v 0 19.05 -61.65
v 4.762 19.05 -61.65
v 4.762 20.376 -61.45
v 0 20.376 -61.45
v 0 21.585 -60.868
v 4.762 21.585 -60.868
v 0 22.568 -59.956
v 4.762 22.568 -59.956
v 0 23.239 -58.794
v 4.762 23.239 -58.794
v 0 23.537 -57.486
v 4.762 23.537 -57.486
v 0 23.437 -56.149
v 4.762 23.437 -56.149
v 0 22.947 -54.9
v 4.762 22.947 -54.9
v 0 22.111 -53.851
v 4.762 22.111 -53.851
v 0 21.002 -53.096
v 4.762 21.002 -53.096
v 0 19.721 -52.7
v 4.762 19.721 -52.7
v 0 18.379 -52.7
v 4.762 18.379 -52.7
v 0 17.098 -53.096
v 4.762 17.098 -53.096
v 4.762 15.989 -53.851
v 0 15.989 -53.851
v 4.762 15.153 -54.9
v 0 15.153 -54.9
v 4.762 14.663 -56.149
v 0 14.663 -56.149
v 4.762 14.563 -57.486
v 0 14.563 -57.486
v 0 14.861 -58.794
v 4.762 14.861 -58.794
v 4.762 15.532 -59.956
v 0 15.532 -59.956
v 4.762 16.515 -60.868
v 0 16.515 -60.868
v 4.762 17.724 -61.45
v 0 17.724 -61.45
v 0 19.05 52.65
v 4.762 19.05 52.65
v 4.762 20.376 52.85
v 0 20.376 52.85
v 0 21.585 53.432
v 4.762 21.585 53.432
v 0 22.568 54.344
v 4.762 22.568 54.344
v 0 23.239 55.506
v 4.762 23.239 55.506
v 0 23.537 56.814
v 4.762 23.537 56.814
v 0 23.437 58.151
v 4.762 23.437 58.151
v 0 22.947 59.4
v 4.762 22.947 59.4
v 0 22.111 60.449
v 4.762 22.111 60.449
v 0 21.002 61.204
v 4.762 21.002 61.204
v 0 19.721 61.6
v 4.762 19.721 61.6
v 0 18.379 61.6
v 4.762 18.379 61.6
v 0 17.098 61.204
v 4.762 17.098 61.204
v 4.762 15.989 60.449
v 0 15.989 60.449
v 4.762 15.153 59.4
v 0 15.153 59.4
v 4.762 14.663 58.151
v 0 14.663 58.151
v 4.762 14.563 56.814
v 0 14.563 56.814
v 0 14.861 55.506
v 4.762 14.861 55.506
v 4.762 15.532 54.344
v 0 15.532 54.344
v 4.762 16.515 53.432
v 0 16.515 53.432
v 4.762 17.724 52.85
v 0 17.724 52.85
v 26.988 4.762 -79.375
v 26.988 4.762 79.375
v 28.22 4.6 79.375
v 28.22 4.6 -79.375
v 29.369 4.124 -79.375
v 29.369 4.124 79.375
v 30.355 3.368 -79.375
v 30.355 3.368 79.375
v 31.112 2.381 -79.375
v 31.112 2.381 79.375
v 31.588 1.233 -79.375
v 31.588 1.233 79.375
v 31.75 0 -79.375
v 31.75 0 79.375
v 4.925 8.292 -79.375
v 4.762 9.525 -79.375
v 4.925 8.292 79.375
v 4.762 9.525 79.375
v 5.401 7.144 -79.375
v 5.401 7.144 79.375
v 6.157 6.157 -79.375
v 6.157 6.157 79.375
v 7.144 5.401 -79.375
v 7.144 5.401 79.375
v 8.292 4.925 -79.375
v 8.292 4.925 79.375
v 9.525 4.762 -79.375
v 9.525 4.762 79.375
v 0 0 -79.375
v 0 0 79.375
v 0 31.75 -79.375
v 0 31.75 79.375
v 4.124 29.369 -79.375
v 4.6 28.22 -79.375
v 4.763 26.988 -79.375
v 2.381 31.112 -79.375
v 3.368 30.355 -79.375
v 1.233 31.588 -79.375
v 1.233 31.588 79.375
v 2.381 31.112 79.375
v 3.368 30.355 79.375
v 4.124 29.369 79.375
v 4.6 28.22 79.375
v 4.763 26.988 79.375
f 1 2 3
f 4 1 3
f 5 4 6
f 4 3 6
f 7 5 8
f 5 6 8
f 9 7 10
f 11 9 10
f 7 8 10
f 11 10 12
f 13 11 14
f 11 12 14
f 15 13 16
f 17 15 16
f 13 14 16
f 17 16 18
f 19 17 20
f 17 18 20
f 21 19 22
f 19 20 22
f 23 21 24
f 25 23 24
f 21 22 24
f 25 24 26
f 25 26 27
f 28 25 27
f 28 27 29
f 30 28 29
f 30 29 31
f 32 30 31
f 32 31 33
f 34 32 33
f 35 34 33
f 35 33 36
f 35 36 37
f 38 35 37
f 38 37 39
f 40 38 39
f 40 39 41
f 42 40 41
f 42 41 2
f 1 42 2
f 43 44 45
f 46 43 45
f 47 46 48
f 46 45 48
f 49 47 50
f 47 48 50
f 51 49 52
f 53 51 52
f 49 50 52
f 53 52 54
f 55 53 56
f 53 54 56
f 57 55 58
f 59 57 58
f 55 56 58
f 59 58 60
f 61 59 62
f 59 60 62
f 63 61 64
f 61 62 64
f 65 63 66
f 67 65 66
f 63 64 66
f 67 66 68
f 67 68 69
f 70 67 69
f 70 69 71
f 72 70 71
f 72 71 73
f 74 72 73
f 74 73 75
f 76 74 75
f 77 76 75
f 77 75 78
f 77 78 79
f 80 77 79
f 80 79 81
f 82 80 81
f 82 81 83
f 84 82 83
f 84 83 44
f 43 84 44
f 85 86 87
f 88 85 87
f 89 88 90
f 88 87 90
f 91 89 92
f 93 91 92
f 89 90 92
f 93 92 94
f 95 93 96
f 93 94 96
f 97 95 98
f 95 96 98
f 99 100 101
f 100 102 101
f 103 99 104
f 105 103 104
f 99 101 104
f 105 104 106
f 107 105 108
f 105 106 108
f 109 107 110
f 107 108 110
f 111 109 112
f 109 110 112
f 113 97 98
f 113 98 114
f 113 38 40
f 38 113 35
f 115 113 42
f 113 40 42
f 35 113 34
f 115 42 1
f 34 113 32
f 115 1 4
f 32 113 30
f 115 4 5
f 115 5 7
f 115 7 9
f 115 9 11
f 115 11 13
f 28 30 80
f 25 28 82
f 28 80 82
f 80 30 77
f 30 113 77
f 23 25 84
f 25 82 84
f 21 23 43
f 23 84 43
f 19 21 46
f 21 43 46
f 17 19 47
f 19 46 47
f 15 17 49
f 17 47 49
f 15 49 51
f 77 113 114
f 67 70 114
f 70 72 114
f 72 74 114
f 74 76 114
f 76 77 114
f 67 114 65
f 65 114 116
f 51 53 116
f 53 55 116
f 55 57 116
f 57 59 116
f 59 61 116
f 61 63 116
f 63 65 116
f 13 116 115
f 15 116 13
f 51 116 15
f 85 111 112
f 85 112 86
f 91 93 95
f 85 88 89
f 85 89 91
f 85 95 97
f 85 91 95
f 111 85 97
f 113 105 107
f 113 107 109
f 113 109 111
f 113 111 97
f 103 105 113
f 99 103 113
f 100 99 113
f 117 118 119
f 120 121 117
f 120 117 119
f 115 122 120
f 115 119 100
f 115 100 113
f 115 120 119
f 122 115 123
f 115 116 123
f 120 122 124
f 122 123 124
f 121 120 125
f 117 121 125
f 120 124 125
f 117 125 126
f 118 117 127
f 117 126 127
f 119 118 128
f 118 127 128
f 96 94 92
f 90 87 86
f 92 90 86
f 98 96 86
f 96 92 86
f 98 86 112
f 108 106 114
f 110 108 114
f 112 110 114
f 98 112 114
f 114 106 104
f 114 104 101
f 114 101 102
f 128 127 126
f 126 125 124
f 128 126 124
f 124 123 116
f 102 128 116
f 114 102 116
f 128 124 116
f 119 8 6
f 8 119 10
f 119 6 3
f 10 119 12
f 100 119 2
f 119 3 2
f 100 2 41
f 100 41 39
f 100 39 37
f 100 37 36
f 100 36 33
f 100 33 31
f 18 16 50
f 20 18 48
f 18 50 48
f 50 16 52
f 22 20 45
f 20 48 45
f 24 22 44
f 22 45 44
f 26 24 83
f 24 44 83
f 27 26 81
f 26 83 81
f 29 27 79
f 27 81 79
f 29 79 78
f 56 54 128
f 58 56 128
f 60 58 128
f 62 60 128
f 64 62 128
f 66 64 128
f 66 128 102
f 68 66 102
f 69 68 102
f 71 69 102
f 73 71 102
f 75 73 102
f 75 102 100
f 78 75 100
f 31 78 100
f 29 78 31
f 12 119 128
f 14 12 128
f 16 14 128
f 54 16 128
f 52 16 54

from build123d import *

# Parameters (mm, degrees)
BOSS_EXTRUDE1_DEPTH  = 79.375
M8_CLEARANCE_HOLE1_D = 9


with BuildPart() as part:
    # Sketch1 → Boss-Extrude1 (new, symmetric)
    with BuildSketch(Plane.XY):
        with BuildLine():
            Line((0, 0), (0, 31.75))
            ThreePointArc((0, 31.75), (3.367596045, 30.355096045), (4.7625, 26.9875))
            Line((4.7625, 26.9875), (4.7625, 9.525))
            ThreePointArc((4.7625, 9.525), (6.157403955, 6.157403955), (9.525, 4.7625))
            Line((9.525, 4.7625), (26.9875, 4.7625))
            ThreePointArc((26.9875, 4.7625), (30.355096045, 3.367596045), (31.75, 0))
            Line((31.75, 0), (0, 0))
        make_face()
    extrude(amount=BOSS_EXTRUDE1_DEPTH, both=True)

    # M8 Clearance Hole1 (through all)
    with Locations(Plane.ZY):
        with Locations((-57.15, 19.05), (57.15, 19.05)):
            Hole(M8_CLEARANCE_HOLE1_D / 2)


solid = part.part
